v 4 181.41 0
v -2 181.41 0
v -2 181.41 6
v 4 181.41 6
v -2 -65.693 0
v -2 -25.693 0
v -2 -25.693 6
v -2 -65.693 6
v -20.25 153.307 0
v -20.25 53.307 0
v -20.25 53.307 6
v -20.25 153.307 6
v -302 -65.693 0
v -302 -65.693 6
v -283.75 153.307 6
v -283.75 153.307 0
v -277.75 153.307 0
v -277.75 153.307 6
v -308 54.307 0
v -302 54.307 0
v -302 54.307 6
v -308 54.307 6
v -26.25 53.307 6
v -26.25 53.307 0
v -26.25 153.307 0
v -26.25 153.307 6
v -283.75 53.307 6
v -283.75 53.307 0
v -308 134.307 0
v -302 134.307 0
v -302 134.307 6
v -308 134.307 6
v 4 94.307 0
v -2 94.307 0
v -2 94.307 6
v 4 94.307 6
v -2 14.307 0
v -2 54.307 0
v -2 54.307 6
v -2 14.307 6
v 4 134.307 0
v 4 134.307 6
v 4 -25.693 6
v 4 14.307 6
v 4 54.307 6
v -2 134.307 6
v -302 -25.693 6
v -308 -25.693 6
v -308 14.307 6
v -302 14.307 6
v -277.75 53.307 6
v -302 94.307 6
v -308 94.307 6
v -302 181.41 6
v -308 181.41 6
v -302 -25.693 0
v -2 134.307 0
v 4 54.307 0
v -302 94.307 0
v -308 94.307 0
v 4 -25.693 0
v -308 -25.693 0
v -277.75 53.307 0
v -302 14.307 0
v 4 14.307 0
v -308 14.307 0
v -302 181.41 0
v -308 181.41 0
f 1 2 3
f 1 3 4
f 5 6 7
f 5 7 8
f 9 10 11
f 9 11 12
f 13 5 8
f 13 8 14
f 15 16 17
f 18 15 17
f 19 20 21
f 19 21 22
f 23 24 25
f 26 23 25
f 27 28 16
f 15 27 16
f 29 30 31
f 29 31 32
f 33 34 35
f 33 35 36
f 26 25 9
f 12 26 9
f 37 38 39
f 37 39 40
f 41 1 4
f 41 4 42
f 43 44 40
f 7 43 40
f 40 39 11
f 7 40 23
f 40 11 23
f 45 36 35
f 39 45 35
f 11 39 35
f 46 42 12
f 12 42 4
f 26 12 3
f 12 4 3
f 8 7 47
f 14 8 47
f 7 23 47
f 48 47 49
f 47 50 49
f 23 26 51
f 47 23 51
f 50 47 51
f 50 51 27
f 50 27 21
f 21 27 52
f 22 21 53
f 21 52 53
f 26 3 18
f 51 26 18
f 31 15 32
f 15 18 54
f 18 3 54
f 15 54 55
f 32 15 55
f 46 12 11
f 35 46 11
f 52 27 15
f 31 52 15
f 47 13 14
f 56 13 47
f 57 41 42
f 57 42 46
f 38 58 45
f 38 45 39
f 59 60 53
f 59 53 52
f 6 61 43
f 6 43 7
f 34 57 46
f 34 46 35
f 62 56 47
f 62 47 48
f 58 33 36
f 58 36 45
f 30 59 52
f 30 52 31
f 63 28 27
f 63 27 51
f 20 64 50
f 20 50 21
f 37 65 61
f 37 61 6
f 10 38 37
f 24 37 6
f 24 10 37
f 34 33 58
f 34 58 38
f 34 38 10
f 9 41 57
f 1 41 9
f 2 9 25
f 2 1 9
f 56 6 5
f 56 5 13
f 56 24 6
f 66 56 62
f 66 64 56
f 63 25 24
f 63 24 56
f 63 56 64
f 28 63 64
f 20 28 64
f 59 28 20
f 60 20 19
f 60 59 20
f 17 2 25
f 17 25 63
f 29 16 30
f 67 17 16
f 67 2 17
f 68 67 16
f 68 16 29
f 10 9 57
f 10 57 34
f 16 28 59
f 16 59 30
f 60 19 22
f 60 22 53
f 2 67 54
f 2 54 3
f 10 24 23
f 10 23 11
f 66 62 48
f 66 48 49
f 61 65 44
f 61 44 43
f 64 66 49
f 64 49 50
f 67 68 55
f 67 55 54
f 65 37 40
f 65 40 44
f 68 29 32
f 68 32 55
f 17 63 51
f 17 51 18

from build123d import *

# Parameters (mm, degrees)
SKETCH1_W           = 6
SKETCH1_H           = 100.000000002
BOSS_EXTRUDE1_DEPTH = 6


with BuildPart() as part:
    # Sketch1 → Boss-Extrude1 (new body)
    with BuildSketch(Plane.XY):
        Polygon((-302, 181.40990873), (-2, 181.409908735), (4, 181.409908735), (4, 134.306809003), (-2, 134.306809003), (-2, 94.306809003), (4, 94.306809003), (4, 54.306809003), (-2, 54.306809003), (-2, 14.306809003), (4, 14.306809003), (4, -25.693190997), (-2, -25.693190997), (-2, -65.693190997), (-302, -65.693190997), (-302, -25.693191002), (-308, -25.693191002), (-308, 14.306808998), (-302, 14.306808998), (-302, 54.306808998), (-308, 54.306808998), (-308, 94.306808998), (-302, 94.306808998), (-302, 134.306808998), (-308, 134.306808998), (-308, 181.40990873), align=None)
        with Locations((-280.75, 103.306809004)):
            Rectangle(SKETCH1_W, SKETCH1_H, mode=Mode.SUBTRACT)
        with Locations((-23.25, 103.306809004)):
            Rectangle(SKETCH1_W, SKETCH1_H, mode=Mode.SUBTRACT)
    extrude(amount=BOSS_EXTRUDE1_DEPTH)


solid = part.part
